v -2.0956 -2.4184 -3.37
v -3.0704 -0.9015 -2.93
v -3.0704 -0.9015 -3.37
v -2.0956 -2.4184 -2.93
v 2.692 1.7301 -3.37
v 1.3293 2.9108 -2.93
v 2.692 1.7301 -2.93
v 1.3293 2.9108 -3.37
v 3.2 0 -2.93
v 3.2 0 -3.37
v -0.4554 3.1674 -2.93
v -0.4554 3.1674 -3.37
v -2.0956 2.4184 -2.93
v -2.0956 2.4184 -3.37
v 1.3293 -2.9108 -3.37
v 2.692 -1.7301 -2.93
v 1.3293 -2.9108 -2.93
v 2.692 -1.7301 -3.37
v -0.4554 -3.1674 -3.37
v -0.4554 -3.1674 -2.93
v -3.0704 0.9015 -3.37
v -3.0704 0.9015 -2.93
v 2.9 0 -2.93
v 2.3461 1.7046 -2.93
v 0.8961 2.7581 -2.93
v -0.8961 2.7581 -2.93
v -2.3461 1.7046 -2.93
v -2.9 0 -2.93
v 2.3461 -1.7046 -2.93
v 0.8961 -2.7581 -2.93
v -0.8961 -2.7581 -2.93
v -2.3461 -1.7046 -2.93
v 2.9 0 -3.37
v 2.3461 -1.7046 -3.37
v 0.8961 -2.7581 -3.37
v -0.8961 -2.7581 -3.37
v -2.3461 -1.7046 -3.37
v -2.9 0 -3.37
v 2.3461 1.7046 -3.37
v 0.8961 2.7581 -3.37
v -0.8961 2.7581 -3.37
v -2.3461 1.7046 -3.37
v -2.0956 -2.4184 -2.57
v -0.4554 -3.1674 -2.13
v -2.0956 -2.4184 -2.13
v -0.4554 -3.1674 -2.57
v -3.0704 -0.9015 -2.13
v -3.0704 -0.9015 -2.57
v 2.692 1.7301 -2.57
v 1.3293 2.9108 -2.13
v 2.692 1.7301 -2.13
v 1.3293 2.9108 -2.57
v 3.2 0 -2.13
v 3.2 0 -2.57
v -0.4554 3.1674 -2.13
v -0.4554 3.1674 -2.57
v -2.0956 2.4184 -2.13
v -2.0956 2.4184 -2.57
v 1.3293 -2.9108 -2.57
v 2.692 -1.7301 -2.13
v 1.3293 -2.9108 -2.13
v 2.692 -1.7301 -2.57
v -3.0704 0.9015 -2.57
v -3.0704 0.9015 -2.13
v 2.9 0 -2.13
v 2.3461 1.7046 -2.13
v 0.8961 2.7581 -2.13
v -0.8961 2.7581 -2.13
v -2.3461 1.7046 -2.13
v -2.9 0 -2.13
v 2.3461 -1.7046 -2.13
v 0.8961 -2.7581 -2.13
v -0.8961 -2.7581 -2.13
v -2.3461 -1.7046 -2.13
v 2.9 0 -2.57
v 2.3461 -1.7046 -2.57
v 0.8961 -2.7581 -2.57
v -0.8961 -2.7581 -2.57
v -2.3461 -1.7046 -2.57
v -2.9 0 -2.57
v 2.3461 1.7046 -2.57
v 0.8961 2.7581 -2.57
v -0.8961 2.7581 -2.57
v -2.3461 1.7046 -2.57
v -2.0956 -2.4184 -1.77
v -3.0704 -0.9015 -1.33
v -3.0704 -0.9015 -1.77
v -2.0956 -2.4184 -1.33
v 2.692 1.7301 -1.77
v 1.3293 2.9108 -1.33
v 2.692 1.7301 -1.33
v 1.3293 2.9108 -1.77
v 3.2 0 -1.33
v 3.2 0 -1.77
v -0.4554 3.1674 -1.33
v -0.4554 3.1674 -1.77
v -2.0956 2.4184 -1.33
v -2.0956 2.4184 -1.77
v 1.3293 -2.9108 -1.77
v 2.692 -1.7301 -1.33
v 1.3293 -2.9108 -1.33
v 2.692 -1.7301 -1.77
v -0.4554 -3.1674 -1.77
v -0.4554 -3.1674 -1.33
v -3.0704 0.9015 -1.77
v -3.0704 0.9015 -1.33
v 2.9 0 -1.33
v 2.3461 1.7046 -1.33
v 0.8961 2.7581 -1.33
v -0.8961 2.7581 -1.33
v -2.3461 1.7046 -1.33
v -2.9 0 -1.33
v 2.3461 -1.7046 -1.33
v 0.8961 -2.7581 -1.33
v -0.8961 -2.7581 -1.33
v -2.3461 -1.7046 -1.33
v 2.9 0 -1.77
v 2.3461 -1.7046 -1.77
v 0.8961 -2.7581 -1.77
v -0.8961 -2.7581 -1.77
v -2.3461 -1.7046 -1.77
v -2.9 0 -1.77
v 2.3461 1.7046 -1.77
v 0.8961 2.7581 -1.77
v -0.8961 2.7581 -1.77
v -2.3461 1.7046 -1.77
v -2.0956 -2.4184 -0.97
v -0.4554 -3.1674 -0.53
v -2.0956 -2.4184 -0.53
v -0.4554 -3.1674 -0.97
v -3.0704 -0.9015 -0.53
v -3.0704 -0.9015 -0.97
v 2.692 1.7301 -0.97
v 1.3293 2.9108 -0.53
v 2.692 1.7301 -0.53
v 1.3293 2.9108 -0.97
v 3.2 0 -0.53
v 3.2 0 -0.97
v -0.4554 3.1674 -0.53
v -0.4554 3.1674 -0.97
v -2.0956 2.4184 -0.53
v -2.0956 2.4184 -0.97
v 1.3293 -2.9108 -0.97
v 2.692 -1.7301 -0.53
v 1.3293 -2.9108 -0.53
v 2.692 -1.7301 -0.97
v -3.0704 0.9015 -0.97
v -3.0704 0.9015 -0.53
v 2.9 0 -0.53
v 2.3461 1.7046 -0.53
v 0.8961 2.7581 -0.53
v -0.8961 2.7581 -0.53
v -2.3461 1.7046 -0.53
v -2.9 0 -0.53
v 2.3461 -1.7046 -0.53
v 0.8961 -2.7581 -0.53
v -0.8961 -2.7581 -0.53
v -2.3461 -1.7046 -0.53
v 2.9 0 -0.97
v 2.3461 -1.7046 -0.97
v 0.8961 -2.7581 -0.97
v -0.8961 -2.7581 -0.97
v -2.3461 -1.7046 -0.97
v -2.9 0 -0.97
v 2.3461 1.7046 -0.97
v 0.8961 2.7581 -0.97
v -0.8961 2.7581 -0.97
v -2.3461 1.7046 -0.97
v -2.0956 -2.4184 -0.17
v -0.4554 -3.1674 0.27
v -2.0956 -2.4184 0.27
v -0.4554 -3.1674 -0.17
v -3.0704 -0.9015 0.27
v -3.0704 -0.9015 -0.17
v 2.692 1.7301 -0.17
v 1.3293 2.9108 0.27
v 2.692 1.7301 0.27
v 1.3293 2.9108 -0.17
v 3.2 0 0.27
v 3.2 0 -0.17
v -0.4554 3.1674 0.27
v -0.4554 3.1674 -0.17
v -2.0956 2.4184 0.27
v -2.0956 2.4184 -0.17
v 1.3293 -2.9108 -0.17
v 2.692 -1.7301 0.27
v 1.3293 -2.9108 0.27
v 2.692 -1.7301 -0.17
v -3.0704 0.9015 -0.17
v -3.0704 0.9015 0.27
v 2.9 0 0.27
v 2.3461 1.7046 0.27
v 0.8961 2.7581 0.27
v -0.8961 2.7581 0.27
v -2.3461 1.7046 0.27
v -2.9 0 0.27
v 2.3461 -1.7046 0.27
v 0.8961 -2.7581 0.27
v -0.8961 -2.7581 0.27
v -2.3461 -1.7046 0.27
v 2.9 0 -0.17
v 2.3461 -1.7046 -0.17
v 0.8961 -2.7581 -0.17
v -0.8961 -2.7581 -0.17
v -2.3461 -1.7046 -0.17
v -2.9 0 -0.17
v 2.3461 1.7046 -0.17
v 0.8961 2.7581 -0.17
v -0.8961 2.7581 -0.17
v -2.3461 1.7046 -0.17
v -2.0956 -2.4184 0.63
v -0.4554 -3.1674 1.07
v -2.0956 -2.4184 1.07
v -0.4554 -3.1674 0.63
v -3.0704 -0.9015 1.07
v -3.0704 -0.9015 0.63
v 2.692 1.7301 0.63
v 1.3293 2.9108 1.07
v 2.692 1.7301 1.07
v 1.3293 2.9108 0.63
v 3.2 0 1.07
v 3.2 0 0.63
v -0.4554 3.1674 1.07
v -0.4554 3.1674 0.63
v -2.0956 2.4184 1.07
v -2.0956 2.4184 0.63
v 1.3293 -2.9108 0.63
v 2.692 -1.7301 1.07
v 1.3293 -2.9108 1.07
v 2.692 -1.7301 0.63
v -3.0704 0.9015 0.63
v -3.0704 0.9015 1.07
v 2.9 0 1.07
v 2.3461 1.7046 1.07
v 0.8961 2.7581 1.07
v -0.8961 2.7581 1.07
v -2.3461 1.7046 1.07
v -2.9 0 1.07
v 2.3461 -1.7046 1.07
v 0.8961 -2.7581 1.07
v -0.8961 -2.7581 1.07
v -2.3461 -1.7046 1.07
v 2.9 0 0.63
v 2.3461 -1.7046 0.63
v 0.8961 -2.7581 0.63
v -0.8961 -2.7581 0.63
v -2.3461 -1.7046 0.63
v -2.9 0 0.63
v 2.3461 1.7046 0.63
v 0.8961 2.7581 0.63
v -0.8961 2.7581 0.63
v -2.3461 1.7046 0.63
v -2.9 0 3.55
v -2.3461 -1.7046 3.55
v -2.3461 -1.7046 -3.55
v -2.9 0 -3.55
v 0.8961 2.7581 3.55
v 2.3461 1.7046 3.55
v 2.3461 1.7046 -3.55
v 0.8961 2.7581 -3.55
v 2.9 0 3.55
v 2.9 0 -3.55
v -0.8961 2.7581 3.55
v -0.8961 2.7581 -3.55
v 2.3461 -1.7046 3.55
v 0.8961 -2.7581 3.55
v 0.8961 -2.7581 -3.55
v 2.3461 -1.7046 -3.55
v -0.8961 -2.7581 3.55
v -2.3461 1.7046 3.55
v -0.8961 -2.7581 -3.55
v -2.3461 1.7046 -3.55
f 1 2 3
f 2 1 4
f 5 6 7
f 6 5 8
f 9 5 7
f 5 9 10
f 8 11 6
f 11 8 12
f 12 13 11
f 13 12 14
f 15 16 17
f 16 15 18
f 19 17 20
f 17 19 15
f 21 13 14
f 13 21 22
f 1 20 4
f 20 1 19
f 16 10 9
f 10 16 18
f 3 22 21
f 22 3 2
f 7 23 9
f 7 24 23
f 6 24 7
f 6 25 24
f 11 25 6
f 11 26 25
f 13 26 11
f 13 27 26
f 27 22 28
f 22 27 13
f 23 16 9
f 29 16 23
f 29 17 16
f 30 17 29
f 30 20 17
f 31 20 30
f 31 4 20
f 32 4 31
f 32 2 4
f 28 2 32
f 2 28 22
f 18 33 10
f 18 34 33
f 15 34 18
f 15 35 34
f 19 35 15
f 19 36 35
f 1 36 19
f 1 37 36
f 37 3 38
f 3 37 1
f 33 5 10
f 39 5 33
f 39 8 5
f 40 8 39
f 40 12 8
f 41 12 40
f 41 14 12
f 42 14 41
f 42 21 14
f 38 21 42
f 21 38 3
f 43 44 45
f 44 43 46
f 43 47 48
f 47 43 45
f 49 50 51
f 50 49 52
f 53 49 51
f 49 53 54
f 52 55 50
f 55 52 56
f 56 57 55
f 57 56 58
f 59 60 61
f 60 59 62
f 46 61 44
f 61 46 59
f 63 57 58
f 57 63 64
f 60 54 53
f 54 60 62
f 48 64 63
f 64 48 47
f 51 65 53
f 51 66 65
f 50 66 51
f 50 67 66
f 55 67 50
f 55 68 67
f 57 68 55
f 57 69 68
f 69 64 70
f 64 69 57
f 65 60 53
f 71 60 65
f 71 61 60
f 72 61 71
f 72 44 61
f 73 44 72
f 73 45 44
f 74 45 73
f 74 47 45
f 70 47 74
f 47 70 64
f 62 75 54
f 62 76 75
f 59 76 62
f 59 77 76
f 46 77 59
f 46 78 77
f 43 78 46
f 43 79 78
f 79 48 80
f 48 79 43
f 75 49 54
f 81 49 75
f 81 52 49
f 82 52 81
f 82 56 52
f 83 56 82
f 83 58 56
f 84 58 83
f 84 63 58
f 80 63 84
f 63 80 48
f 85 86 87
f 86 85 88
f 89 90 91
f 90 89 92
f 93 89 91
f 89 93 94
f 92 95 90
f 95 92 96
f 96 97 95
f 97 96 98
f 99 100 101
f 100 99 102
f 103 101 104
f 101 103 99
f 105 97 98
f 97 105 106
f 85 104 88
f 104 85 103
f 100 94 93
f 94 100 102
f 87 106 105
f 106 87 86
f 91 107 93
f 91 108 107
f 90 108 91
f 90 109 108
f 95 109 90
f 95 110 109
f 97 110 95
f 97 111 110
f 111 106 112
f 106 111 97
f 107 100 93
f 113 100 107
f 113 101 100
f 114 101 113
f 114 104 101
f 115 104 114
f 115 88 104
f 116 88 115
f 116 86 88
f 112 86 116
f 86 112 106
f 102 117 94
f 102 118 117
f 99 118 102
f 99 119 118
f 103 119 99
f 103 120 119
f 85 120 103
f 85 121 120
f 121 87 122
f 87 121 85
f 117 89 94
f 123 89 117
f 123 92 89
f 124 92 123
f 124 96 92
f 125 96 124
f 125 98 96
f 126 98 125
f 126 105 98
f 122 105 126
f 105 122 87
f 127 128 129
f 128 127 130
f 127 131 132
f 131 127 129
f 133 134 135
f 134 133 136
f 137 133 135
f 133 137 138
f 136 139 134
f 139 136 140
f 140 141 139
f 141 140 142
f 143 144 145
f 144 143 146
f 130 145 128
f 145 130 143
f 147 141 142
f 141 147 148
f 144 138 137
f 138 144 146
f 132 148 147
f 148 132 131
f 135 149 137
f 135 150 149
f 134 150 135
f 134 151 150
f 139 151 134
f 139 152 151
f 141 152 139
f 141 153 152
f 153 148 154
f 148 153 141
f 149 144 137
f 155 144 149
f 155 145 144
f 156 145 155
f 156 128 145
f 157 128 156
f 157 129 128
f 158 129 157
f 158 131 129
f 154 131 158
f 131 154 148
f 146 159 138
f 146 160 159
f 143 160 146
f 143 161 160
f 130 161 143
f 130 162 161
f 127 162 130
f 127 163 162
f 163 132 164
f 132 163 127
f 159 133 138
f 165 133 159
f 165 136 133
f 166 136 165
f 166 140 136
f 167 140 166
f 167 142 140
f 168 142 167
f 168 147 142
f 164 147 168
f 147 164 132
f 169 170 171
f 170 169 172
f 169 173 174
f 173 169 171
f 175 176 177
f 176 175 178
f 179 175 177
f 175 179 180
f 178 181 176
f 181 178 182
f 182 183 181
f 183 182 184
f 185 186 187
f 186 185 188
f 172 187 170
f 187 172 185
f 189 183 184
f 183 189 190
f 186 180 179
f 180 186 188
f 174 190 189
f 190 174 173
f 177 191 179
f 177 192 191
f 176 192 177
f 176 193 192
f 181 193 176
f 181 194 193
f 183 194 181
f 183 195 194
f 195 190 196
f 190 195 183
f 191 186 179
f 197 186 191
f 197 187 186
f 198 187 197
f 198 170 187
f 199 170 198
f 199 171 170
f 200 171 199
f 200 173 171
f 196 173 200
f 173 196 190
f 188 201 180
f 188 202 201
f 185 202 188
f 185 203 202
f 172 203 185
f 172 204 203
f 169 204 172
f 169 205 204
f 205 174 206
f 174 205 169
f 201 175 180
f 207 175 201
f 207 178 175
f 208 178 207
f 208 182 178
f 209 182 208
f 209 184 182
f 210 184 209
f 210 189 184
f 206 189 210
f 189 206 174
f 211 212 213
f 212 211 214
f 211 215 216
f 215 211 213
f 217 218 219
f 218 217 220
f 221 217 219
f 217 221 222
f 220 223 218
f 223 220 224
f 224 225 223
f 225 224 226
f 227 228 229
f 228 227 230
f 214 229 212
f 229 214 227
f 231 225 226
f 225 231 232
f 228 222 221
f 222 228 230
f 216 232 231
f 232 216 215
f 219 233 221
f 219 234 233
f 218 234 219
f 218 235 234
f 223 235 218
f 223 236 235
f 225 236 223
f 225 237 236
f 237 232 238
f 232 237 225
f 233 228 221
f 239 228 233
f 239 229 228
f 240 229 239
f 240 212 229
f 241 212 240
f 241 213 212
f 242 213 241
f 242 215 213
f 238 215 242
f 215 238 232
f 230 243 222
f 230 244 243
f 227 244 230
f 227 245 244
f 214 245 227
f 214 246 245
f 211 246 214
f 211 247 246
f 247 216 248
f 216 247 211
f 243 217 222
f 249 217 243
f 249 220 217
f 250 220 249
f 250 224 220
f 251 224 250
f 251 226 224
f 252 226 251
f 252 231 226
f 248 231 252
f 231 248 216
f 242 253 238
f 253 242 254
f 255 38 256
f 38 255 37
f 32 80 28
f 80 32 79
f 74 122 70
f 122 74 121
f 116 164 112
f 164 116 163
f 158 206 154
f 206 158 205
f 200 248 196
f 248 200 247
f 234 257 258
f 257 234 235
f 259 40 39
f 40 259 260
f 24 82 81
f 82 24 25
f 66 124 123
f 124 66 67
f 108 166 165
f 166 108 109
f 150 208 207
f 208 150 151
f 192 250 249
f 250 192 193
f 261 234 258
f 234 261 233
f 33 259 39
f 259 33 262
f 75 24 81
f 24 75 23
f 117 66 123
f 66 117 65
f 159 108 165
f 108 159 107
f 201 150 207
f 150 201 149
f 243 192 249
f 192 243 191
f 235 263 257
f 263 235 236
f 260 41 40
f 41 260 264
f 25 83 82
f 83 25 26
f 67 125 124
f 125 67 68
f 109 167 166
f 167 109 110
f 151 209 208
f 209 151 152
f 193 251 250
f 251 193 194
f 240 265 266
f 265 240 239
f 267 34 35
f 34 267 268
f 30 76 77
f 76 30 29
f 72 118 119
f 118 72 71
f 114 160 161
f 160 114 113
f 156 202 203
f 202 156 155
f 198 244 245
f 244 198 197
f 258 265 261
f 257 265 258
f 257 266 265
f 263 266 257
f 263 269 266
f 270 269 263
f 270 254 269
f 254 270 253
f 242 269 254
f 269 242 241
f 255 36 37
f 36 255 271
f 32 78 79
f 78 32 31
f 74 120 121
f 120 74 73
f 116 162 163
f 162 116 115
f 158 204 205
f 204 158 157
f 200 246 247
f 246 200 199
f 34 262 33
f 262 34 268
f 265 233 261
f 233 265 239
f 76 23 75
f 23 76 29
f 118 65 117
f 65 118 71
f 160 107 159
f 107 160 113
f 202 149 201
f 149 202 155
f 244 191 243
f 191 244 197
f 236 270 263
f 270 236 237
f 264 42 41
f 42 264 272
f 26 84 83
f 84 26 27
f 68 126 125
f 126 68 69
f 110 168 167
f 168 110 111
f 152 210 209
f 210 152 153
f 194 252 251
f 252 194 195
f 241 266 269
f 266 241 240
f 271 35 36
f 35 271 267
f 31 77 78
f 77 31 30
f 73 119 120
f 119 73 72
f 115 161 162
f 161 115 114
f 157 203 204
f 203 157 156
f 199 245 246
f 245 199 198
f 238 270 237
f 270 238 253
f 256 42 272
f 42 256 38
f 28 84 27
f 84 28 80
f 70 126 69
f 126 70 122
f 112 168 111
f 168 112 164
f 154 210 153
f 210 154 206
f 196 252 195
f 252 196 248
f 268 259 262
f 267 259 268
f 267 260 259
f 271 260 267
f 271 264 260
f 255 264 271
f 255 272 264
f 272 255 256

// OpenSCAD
// Parameters
outer_diameter_mm = 5.8; //[2.9:11.6:0.1]
length_mm = 7.1; //[3.55:14.2:0.1]
screw_nominal_diameter_mm = 5.0; //[2.5:10:0.1]
internal_thread_pitch_mm = 0.8; //[0.4:1.6:0.05]
internal_bore_diameter_mm = 4.2; //[3.2:5:0.05]
lead_in_chamfer_angle_deg = 30; //[15:60:1]
lead_in_chamfer_depth_mm = 0.5; //[0.25:1:0.05]
outer_profile_depth_mm = 0.3; //[0.15:0.6:0.05]
outer_profile_pitch_mm = 0.8; //[0.4:1.6:0.05]
outer_profile_rings_count = 6; //[3:14:1]
outer_profile_ring_width_factor = 0.55; //[0.3:0.9:0.05]
overlap_mm = 0.8; //[0.5:2:0.1]

// Threaded Insert - complete geometry
module threaded_insert() {
  color([0.8, 0.6, 0.2]) { // Brass color
    // Main body with knurl/barb profile
    union() {
      // Base cylinder
      cylinder(h=length_mm, r=outer_diameter_mm/2, center=true);
      
      // Knurl/barb rings
      for (i = [0:outer_profile_rings_count-1]) {
        translate([0, 0, -length_mm/2 + outer_profile_pitch_mm*(i+0.5)])
          cylinder(h=outer_profile_pitch_mm*outer_profile_ring_width_factor, 
                   r=outer_diameter_mm/2 + outer_profile_depth_mm, center=true);
      }
    }
    
    // Internal bore and lead-in chamfer
    difference() {
      // Outer profile
      union() {
        // Base cylinder with knurl/barb profile
        cylinder(h=length_mm, r=outer_diameter_mm/2, center=true);
        
        // Knurl/barb rings
        for (i = [0:outer_profile_rings_count-1]) {
          translate([0, 0, -length_mm/2 + outer_profile_pitch_mm*(i+0.5)])
            cylinder(h=outer_profile_pitch_mm*outer_profile_ring_width_factor, 
                     r=outer_diameter_mm/2 + outer_profile_depth_mm, center=true);
        }
      }
      
      // Internal bore
      cylinder(h=length_mm + 2*overlap_mm, r=internal_bore_diameter_mm/2, center=true);
      
      // Lead-in chamfer
      translate([0, 0, length_mm/2 - (lead_in_chamfer_depth_mm + overlap_mm)/2])
        cylinder(h=lead_in_chamfer_depth_mm + overlap_mm, 
                 r1=outer_diameter_mm/2, r2=internal_bore_diameter_mm/2, center=true);
    }
  }
}

// Assembly
module assembly() {
  threaded_insert();
}

assembly();
